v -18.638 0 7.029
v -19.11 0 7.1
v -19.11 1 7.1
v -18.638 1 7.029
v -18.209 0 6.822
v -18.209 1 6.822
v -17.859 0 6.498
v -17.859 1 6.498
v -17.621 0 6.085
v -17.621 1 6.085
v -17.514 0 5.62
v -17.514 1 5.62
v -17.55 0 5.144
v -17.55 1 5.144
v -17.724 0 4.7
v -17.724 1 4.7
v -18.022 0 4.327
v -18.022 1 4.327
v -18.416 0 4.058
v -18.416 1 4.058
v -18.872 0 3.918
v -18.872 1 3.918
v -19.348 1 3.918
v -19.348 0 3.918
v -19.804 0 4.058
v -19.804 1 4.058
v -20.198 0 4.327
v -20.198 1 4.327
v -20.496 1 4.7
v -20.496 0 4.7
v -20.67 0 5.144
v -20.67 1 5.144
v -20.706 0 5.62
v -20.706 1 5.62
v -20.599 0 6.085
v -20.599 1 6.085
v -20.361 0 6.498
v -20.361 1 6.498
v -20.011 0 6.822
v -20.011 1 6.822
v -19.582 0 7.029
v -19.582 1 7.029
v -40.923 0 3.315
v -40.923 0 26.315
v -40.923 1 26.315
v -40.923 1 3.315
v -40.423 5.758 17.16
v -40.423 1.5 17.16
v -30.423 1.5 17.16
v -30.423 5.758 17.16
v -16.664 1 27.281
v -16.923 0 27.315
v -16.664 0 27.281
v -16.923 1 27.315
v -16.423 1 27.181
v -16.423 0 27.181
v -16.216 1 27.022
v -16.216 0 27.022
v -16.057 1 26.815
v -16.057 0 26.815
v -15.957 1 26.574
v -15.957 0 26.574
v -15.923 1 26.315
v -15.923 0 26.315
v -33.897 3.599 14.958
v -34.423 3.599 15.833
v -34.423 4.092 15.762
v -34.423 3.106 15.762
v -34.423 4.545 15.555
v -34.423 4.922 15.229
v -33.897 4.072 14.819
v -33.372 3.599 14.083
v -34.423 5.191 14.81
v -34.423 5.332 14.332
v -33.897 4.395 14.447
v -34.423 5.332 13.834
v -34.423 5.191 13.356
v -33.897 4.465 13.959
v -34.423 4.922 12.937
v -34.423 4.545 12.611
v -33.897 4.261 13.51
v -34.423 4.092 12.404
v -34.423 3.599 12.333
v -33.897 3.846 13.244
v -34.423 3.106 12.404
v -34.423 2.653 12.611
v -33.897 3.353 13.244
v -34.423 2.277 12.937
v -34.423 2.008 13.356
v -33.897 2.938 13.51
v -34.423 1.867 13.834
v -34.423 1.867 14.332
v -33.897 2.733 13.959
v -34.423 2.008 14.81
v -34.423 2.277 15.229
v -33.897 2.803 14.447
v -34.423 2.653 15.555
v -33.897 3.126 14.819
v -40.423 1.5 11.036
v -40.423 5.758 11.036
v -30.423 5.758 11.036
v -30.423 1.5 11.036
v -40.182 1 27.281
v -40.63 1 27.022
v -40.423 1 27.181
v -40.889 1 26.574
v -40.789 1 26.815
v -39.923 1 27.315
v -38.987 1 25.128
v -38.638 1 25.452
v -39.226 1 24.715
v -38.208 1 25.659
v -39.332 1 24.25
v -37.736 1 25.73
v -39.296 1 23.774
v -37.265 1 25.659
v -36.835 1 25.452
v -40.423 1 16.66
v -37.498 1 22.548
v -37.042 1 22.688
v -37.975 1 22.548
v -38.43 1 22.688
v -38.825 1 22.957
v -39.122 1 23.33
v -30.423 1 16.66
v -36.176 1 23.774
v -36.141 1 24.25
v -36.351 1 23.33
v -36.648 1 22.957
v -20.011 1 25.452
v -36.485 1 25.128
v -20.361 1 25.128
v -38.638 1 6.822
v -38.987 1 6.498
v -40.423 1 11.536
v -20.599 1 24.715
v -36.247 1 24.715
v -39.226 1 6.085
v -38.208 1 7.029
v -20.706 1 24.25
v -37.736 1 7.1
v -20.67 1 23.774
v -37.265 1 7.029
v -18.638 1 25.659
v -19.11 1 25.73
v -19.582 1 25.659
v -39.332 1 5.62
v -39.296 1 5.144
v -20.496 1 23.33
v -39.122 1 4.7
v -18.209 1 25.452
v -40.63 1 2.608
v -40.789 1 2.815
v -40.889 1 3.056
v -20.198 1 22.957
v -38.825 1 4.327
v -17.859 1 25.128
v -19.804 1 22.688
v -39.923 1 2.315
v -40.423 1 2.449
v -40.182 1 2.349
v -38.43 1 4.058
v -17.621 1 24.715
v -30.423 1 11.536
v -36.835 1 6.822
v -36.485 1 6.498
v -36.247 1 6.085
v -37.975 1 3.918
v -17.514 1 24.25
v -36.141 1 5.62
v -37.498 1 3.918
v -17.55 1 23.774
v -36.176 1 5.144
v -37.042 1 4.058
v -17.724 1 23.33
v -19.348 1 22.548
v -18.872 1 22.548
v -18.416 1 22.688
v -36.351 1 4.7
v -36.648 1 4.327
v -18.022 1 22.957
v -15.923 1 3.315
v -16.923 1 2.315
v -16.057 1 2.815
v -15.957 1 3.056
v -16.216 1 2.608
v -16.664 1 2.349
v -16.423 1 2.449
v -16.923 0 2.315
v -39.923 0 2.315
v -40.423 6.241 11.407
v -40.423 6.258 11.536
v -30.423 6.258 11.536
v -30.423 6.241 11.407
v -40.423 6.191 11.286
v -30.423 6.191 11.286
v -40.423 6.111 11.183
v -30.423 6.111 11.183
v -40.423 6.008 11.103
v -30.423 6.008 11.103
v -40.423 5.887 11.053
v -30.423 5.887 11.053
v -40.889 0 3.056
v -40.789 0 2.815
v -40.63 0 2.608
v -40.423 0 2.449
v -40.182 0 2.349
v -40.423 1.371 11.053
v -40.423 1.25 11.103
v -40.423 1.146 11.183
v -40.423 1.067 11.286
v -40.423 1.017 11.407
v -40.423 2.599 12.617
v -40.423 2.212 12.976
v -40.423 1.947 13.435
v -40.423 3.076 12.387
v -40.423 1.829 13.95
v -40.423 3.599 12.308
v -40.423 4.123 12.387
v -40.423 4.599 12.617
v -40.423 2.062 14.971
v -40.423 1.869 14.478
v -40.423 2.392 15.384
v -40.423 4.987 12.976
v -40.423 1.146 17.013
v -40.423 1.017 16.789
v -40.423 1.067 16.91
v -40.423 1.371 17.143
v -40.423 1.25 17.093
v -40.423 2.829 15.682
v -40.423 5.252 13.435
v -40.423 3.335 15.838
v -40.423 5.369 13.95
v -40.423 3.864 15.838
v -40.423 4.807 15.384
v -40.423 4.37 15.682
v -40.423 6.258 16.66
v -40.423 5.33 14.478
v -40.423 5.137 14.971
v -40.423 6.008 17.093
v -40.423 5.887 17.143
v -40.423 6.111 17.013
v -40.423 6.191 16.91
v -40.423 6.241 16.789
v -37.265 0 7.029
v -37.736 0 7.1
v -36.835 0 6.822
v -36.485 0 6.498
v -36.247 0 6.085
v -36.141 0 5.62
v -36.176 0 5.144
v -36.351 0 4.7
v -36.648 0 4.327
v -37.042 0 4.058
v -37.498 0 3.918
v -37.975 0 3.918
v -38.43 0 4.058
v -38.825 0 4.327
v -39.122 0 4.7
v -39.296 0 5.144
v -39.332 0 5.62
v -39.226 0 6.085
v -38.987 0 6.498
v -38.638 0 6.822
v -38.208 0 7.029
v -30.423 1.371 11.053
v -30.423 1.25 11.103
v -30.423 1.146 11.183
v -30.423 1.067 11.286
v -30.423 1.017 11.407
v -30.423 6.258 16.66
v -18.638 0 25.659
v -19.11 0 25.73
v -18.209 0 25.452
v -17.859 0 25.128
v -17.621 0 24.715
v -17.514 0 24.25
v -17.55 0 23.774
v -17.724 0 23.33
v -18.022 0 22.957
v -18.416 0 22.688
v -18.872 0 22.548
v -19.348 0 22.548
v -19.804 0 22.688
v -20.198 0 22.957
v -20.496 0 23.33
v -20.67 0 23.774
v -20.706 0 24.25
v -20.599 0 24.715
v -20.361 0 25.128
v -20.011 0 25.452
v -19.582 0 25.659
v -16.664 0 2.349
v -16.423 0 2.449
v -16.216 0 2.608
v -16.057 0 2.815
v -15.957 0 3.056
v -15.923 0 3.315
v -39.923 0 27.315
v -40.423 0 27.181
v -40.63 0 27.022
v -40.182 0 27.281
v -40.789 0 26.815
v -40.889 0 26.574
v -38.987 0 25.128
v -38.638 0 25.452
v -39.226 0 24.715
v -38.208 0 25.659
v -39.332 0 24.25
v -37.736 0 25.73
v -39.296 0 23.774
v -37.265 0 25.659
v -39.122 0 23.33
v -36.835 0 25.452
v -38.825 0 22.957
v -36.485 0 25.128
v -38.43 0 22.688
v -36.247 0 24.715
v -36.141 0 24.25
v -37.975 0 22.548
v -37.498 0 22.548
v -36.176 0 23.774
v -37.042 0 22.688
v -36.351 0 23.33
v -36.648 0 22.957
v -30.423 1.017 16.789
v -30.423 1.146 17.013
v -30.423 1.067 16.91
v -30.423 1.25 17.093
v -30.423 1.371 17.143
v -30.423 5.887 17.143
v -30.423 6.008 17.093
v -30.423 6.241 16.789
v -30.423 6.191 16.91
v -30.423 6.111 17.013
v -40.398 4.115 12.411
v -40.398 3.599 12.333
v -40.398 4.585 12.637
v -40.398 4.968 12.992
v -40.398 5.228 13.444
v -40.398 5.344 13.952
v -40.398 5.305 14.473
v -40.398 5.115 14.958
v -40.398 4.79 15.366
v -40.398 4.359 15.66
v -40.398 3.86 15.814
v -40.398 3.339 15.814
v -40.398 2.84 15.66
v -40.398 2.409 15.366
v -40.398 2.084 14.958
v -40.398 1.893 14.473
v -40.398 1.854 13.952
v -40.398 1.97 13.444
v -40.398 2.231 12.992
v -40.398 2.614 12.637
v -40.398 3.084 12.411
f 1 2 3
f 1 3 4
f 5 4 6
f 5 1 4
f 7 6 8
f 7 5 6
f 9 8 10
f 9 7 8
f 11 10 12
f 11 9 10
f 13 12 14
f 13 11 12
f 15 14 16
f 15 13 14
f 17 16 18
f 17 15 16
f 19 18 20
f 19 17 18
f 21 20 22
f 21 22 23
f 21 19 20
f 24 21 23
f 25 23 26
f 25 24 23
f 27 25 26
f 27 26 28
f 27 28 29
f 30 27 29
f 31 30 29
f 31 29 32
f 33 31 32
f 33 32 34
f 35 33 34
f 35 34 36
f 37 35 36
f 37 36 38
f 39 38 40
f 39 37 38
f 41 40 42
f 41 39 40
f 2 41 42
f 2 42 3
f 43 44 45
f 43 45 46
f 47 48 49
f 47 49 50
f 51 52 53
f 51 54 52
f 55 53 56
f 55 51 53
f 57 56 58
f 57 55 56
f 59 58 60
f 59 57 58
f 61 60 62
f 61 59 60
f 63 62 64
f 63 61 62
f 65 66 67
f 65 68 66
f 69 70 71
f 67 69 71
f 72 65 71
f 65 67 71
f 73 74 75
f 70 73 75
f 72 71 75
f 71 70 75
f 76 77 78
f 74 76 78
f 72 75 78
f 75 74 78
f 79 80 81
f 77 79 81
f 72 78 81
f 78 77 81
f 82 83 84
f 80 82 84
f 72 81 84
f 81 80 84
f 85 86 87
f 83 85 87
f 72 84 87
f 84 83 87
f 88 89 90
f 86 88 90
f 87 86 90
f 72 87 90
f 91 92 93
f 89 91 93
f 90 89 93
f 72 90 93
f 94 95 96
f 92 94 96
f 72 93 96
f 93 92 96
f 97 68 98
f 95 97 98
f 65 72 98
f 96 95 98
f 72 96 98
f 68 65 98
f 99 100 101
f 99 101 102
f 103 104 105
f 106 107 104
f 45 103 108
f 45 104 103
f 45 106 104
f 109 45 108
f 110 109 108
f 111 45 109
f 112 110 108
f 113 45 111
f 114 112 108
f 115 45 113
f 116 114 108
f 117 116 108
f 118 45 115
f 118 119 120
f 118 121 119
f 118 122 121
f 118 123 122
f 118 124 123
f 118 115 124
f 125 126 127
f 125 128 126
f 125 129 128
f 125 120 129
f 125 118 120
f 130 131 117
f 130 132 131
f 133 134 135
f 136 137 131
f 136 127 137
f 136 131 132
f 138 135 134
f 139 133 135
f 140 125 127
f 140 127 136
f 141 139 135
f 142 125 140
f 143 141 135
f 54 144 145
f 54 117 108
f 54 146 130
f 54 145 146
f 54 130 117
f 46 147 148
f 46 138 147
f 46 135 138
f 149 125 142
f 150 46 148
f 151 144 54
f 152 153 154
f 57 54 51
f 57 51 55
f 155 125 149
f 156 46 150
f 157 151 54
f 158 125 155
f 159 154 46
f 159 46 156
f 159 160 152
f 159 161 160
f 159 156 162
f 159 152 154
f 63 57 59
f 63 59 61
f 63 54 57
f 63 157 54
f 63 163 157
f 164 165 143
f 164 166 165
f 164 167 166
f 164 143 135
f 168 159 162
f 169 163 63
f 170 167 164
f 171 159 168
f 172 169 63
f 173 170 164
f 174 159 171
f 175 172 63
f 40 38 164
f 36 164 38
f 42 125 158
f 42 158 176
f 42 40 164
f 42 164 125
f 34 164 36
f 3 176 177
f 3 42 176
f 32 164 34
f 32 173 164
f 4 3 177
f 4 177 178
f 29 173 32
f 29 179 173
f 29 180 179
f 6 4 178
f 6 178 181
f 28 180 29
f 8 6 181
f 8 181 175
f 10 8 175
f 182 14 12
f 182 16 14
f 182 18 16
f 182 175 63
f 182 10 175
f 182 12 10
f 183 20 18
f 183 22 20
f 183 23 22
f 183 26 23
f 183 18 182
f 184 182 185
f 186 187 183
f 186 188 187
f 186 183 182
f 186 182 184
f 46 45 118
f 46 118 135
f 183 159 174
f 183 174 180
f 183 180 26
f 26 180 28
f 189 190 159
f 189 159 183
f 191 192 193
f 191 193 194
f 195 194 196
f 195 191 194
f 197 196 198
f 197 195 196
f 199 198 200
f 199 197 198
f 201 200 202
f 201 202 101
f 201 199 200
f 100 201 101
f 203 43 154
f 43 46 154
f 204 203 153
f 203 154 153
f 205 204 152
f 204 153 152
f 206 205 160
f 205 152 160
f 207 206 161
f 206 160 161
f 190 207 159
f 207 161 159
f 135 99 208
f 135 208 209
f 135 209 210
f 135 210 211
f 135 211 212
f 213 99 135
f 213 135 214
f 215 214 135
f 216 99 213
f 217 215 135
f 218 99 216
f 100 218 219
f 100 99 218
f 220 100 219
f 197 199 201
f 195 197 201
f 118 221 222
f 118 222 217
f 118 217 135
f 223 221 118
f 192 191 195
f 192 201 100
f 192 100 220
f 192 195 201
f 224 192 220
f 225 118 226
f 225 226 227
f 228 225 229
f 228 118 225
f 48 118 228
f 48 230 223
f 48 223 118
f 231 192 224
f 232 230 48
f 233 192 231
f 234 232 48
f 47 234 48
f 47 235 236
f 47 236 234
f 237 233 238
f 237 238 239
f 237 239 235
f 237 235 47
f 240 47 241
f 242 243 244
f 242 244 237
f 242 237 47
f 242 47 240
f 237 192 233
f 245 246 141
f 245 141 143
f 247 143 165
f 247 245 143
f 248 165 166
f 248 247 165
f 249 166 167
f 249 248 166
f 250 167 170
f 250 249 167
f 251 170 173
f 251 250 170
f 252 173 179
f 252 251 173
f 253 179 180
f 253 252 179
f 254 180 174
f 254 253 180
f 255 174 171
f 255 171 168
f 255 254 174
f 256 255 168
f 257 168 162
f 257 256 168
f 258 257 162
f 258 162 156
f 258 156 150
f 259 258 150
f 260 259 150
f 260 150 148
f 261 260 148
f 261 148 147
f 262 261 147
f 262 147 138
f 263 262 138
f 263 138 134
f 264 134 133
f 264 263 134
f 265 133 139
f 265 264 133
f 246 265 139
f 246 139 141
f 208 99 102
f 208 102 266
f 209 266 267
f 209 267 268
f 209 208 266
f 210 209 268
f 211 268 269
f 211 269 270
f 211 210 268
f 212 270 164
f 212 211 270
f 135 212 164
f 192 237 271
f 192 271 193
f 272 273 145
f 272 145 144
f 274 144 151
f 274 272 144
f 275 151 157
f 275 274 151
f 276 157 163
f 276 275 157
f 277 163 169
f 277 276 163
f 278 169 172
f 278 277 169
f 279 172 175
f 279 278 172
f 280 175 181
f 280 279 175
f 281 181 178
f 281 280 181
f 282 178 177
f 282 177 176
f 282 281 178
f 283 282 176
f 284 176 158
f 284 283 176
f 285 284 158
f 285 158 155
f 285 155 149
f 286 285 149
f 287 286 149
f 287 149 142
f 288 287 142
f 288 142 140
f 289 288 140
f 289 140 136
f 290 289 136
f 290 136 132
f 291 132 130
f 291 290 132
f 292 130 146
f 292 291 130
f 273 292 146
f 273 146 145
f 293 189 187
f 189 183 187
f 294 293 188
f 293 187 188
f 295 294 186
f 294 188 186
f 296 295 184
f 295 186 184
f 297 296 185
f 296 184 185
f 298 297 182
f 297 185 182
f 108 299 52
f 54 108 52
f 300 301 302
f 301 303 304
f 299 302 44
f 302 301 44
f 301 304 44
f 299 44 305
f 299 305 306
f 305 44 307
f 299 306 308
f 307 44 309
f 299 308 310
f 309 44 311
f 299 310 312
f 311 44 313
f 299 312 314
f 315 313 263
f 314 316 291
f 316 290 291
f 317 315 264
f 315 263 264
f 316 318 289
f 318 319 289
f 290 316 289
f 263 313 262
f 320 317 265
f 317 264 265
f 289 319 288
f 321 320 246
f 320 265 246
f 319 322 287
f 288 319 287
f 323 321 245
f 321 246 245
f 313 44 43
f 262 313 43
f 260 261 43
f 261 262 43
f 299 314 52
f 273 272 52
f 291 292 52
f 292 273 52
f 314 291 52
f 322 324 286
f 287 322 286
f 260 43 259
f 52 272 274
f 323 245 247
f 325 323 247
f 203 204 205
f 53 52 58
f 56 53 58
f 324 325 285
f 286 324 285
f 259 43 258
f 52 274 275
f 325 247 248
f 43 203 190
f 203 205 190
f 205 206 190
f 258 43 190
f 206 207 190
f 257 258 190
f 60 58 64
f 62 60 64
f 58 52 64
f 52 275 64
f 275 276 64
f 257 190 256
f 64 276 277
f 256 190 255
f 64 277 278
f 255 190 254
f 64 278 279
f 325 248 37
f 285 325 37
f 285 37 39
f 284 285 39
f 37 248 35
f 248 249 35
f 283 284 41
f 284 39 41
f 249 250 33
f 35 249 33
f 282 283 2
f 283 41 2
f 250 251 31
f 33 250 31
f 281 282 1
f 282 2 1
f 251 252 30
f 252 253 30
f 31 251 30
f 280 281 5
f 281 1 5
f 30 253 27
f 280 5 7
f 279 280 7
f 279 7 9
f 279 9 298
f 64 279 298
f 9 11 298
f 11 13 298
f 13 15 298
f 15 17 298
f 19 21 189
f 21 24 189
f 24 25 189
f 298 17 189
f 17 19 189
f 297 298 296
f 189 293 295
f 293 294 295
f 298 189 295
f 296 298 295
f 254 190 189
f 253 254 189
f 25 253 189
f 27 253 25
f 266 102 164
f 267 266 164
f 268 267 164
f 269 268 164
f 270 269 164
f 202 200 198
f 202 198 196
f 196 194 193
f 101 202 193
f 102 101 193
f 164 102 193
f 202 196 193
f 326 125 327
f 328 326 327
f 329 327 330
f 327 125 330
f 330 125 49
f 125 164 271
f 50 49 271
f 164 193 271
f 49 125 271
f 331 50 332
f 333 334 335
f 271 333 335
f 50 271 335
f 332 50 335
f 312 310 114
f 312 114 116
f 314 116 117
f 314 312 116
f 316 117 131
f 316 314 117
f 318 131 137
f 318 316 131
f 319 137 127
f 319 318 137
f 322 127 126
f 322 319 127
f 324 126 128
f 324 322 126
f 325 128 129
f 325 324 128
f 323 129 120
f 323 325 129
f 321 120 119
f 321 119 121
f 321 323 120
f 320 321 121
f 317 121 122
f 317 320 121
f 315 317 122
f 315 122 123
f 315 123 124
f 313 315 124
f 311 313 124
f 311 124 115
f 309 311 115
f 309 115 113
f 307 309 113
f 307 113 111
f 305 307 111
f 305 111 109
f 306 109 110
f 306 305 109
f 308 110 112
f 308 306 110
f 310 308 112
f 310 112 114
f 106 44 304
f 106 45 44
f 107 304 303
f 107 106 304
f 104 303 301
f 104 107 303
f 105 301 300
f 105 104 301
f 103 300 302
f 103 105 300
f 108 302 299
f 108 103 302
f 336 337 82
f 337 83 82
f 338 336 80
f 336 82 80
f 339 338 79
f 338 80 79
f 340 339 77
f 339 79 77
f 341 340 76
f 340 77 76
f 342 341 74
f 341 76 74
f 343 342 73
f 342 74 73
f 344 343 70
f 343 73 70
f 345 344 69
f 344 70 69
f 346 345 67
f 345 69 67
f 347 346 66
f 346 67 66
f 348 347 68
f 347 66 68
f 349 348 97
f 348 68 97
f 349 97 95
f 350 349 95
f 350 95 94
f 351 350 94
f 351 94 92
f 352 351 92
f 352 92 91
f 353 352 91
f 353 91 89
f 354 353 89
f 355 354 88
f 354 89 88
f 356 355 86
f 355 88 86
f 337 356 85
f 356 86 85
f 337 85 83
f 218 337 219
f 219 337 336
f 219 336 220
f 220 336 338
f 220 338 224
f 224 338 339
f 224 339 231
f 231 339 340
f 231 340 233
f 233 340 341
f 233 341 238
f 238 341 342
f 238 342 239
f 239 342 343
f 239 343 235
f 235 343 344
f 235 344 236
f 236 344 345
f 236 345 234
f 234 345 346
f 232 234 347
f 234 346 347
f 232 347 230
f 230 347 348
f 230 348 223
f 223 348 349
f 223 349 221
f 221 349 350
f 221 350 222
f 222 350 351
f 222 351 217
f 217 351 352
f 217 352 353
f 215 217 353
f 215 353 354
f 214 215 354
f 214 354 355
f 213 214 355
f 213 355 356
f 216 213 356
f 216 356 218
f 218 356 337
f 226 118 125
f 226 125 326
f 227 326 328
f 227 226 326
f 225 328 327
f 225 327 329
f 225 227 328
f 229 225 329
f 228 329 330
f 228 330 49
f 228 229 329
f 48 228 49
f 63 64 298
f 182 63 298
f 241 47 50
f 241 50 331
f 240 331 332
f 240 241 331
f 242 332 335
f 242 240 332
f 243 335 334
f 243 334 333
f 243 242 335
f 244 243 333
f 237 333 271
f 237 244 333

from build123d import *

# Parameters (mm, degrees)
SKETCH_2_W                        = 25
SKETCH_2_H                        = 25
SKETCH_2_R                        = 1.6
EXTRUDE_1_DEPTH                   = 1
FILLET_1_R                        = 1
EXTRUDE_START                     = -0.5
EXTRUDE_2_DEPTH                   = 10
HOLE_WIZARD_3_5_3_5_1_D           = 3.5
HOLE_WIZARD_3_5_3_5_1_DEPTH       = 6
HOLE_WIZARD_3_5_3_5_1_CSINK_D     = 3.55
HOLE_WIZARD_3_5_3_5_1_CSINK_ANGLE = 90
HOLE_WIZARD_3_5_3_5_1_TIP         = 1.051506083


with BuildPart() as part:
    # 스케치2 → 보스-돌출1 (new body)
    with BuildSketch(Plane(origin=(0, 0, 0), x_dir=(1, 0, 0), z_dir=(0, 1, 0))):
        with Locations((-28.42313588, -14.815)):
            Rectangle(SKETCH_2_W, SKETCH_2_H)
        with Locations(Location((-19.11, -24.13, 0), (0, 0, 270))):
            Circle(SKETCH_2_R, mode=Mode.SUBTRACT)
        with Locations(Location((-37.73627176, -24.13, 0), (0, 0, 270))):
            Circle(SKETCH_2_R, mode=Mode.SUBTRACT)
        with Locations(Location((-37.73627176, -5.5, 0), (0, 0, 270))):
            Circle(SKETCH_2_R, mode=Mode.SUBTRACT)
        with Locations(Location((-19.11, -5.5, 0), (0, 0, 270))):
            Circle(SKETCH_2_R, mode=Mode.SUBTRACT)
    extrude(amount=EXTRUDE_1_DEPTH)

    # 필렛1
    fillet_1_edges = [part.edges().sort_by_distance(p)[0] for p in [
        (-15.92313588, 0.5, 27.315),
        (-40.92313588, 0.5, 27.315),
        (-40.92313588, 0.5, 2.315),
        (-15.92313588, 0.5, 2.315),
    ]]
    fillet(fillet_1_edges, radius=FILLET_1_R)

    # 스케치4 → 보스-돌출2 (add)
    with BuildSketch(Plane.ZY.offset(40.92313588).offset(EXTRUDE_START)):
        with BuildLine():
            Line((11.536225379, 1), (16.659931287, 1))
            ThreePointArc((16.659931287, 1), (17.013484677, 1.146446609), (17.159931287, 1.5))
            Line((17.159931287, 1.5), (17.159931287, 5.75777714))
            ThreePointArc((17.159931287, 5.75777714), (17.013484677, 6.111330531), (16.659931287, 6.25777714))
            Line((16.659931287, 6.25777714), (11.536225379, 6.25777714))
            ThreePointArc((11.536225379, 6.25777714), (11.182671988, 6.111330531), (11.036225379, 5.75777714))
            Line((11.036225379, 5.75777714), (11.036225379, 1.5))
            ThreePointArc((11.036225379, 1.5), (11.182671988, 1.146446609), (11.536225379, 1))
        make_face()
    extrude(amount=-EXTRUDE_2_DEPTH)

    # Ø3.5 (3.5) 지름 구멍1
    with Locations(Plane.ZY.offset(40.42313588)):
        with Locations((14.083142465, 3.599368414)):
            CounterSinkHole(HOLE_WIZARD_3_5_3_5_1_D / 2, HOLE_WIZARD_3_5_3_5_1_CSINK_D / 2, depth=HOLE_WIZARD_3_5_3_5_1_DEPTH, counter_sink_angle=HOLE_WIZARD_3_5_3_5_1_CSINK_ANGLE)
            with Locations((0, 0, -(HOLE_WIZARD_3_5_3_5_1_DEPTH + HOLE_WIZARD_3_5_3_5_1_TIP / 2))):  # 118° drill point
                Cone(0, HOLE_WIZARD_3_5_3_5_1_D / 2, HOLE_WIZARD_3_5_3_5_1_TIP, mode=Mode.SUBTRACT)


solid = part.part
